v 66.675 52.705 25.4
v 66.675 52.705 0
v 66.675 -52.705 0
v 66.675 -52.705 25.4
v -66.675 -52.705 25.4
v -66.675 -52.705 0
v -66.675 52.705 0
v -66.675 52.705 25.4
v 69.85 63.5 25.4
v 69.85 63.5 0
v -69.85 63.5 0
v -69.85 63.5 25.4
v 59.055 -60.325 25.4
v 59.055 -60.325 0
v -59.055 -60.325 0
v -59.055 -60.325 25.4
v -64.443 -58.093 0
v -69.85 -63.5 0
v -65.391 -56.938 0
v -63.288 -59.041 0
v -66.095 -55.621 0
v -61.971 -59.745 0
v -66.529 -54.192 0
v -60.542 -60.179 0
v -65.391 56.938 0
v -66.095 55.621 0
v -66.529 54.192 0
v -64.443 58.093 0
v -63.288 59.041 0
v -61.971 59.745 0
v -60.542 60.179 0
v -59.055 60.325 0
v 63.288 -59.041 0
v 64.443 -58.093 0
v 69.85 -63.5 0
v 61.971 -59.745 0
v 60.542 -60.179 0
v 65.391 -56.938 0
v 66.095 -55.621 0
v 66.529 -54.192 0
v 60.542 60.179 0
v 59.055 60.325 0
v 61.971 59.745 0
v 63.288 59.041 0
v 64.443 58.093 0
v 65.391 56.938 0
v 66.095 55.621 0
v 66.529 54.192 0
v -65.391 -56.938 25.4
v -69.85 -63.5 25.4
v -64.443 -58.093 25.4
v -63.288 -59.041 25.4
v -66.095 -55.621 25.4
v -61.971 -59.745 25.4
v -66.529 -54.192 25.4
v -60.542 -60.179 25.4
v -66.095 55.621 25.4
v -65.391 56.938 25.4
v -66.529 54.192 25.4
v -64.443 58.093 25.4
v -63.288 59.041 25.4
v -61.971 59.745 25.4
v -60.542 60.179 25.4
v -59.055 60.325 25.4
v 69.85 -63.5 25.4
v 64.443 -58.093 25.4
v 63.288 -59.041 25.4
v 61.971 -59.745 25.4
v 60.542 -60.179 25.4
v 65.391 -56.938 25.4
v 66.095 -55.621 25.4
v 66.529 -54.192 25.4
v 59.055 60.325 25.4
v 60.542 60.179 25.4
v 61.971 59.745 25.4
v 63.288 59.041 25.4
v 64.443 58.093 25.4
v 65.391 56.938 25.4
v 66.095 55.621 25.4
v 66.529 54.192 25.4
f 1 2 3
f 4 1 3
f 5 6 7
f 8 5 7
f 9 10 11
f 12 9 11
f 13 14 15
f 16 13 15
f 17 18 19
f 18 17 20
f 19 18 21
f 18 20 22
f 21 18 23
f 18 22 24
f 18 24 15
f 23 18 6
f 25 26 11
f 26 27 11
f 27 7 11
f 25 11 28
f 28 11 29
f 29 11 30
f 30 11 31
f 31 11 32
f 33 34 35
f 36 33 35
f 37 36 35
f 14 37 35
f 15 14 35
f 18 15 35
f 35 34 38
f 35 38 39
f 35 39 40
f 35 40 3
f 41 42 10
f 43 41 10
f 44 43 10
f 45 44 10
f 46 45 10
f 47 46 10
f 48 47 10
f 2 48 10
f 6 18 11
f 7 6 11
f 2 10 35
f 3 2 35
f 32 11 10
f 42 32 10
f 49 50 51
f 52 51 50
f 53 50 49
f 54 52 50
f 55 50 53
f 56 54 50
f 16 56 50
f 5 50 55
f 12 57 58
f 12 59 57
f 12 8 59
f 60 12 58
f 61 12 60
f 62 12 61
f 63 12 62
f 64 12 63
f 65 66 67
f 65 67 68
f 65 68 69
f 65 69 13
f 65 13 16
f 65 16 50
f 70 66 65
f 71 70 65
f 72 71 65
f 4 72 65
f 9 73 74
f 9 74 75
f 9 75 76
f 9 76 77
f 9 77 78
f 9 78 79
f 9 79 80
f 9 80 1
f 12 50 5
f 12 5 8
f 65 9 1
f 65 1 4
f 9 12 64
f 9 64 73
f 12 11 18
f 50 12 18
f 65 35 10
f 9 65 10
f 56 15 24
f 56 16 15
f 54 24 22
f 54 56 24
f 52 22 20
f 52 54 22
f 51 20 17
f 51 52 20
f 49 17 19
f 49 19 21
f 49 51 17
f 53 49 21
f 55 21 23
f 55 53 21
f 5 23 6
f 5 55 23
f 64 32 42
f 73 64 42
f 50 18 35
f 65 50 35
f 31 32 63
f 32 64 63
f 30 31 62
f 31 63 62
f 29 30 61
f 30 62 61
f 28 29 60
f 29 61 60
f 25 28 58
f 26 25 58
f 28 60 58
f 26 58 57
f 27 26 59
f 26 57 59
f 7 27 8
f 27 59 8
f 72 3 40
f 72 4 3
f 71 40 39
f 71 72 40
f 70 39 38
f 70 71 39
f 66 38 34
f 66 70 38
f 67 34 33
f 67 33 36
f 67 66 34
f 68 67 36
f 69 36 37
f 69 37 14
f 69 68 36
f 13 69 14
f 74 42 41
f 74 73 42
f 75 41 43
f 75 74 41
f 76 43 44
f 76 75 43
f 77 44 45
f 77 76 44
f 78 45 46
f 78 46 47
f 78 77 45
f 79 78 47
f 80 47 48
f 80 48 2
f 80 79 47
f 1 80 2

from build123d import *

# Parameters (mm, degrees)
F1_DEPTH = 25.4
F2_R     = 7.62


with BuildPart() as f1:
    # F0 (on Top) → F1 (new body)
    with BuildSketch(Plane.XY):
        Polygon((-44.45, 63.5), (-69.85, 63.5), (-69.85, 38.1), (-66.675, 38.1), (-66.675, 60.325), (-44.45, 60.325), align=None)
        Polygon((69.85, 63.5), (-44.45, 63.5), (-44.45, 60.325), (66.675, 60.325), (66.675, -60.325), (-66.675, -60.325), (-66.675, 38.1), (-69.85, 38.1), (-69.85, -63.5), (69.85, -63.5), align=None)
    extrude(amount=F1_DEPTH)

    # F2
    f2_edges = [f1.edges().sort_by_distance(p)[0] for p in [
        (66.675, 60.325, 12.7),
        (66.675, -60.325, 12.7),
        (-66.675, -60.325, 12.7),
        (-66.675, 60.325, 12.7),
    ]]
    fillet(f2_edges, radius=F2_R)


solid = f1.part
